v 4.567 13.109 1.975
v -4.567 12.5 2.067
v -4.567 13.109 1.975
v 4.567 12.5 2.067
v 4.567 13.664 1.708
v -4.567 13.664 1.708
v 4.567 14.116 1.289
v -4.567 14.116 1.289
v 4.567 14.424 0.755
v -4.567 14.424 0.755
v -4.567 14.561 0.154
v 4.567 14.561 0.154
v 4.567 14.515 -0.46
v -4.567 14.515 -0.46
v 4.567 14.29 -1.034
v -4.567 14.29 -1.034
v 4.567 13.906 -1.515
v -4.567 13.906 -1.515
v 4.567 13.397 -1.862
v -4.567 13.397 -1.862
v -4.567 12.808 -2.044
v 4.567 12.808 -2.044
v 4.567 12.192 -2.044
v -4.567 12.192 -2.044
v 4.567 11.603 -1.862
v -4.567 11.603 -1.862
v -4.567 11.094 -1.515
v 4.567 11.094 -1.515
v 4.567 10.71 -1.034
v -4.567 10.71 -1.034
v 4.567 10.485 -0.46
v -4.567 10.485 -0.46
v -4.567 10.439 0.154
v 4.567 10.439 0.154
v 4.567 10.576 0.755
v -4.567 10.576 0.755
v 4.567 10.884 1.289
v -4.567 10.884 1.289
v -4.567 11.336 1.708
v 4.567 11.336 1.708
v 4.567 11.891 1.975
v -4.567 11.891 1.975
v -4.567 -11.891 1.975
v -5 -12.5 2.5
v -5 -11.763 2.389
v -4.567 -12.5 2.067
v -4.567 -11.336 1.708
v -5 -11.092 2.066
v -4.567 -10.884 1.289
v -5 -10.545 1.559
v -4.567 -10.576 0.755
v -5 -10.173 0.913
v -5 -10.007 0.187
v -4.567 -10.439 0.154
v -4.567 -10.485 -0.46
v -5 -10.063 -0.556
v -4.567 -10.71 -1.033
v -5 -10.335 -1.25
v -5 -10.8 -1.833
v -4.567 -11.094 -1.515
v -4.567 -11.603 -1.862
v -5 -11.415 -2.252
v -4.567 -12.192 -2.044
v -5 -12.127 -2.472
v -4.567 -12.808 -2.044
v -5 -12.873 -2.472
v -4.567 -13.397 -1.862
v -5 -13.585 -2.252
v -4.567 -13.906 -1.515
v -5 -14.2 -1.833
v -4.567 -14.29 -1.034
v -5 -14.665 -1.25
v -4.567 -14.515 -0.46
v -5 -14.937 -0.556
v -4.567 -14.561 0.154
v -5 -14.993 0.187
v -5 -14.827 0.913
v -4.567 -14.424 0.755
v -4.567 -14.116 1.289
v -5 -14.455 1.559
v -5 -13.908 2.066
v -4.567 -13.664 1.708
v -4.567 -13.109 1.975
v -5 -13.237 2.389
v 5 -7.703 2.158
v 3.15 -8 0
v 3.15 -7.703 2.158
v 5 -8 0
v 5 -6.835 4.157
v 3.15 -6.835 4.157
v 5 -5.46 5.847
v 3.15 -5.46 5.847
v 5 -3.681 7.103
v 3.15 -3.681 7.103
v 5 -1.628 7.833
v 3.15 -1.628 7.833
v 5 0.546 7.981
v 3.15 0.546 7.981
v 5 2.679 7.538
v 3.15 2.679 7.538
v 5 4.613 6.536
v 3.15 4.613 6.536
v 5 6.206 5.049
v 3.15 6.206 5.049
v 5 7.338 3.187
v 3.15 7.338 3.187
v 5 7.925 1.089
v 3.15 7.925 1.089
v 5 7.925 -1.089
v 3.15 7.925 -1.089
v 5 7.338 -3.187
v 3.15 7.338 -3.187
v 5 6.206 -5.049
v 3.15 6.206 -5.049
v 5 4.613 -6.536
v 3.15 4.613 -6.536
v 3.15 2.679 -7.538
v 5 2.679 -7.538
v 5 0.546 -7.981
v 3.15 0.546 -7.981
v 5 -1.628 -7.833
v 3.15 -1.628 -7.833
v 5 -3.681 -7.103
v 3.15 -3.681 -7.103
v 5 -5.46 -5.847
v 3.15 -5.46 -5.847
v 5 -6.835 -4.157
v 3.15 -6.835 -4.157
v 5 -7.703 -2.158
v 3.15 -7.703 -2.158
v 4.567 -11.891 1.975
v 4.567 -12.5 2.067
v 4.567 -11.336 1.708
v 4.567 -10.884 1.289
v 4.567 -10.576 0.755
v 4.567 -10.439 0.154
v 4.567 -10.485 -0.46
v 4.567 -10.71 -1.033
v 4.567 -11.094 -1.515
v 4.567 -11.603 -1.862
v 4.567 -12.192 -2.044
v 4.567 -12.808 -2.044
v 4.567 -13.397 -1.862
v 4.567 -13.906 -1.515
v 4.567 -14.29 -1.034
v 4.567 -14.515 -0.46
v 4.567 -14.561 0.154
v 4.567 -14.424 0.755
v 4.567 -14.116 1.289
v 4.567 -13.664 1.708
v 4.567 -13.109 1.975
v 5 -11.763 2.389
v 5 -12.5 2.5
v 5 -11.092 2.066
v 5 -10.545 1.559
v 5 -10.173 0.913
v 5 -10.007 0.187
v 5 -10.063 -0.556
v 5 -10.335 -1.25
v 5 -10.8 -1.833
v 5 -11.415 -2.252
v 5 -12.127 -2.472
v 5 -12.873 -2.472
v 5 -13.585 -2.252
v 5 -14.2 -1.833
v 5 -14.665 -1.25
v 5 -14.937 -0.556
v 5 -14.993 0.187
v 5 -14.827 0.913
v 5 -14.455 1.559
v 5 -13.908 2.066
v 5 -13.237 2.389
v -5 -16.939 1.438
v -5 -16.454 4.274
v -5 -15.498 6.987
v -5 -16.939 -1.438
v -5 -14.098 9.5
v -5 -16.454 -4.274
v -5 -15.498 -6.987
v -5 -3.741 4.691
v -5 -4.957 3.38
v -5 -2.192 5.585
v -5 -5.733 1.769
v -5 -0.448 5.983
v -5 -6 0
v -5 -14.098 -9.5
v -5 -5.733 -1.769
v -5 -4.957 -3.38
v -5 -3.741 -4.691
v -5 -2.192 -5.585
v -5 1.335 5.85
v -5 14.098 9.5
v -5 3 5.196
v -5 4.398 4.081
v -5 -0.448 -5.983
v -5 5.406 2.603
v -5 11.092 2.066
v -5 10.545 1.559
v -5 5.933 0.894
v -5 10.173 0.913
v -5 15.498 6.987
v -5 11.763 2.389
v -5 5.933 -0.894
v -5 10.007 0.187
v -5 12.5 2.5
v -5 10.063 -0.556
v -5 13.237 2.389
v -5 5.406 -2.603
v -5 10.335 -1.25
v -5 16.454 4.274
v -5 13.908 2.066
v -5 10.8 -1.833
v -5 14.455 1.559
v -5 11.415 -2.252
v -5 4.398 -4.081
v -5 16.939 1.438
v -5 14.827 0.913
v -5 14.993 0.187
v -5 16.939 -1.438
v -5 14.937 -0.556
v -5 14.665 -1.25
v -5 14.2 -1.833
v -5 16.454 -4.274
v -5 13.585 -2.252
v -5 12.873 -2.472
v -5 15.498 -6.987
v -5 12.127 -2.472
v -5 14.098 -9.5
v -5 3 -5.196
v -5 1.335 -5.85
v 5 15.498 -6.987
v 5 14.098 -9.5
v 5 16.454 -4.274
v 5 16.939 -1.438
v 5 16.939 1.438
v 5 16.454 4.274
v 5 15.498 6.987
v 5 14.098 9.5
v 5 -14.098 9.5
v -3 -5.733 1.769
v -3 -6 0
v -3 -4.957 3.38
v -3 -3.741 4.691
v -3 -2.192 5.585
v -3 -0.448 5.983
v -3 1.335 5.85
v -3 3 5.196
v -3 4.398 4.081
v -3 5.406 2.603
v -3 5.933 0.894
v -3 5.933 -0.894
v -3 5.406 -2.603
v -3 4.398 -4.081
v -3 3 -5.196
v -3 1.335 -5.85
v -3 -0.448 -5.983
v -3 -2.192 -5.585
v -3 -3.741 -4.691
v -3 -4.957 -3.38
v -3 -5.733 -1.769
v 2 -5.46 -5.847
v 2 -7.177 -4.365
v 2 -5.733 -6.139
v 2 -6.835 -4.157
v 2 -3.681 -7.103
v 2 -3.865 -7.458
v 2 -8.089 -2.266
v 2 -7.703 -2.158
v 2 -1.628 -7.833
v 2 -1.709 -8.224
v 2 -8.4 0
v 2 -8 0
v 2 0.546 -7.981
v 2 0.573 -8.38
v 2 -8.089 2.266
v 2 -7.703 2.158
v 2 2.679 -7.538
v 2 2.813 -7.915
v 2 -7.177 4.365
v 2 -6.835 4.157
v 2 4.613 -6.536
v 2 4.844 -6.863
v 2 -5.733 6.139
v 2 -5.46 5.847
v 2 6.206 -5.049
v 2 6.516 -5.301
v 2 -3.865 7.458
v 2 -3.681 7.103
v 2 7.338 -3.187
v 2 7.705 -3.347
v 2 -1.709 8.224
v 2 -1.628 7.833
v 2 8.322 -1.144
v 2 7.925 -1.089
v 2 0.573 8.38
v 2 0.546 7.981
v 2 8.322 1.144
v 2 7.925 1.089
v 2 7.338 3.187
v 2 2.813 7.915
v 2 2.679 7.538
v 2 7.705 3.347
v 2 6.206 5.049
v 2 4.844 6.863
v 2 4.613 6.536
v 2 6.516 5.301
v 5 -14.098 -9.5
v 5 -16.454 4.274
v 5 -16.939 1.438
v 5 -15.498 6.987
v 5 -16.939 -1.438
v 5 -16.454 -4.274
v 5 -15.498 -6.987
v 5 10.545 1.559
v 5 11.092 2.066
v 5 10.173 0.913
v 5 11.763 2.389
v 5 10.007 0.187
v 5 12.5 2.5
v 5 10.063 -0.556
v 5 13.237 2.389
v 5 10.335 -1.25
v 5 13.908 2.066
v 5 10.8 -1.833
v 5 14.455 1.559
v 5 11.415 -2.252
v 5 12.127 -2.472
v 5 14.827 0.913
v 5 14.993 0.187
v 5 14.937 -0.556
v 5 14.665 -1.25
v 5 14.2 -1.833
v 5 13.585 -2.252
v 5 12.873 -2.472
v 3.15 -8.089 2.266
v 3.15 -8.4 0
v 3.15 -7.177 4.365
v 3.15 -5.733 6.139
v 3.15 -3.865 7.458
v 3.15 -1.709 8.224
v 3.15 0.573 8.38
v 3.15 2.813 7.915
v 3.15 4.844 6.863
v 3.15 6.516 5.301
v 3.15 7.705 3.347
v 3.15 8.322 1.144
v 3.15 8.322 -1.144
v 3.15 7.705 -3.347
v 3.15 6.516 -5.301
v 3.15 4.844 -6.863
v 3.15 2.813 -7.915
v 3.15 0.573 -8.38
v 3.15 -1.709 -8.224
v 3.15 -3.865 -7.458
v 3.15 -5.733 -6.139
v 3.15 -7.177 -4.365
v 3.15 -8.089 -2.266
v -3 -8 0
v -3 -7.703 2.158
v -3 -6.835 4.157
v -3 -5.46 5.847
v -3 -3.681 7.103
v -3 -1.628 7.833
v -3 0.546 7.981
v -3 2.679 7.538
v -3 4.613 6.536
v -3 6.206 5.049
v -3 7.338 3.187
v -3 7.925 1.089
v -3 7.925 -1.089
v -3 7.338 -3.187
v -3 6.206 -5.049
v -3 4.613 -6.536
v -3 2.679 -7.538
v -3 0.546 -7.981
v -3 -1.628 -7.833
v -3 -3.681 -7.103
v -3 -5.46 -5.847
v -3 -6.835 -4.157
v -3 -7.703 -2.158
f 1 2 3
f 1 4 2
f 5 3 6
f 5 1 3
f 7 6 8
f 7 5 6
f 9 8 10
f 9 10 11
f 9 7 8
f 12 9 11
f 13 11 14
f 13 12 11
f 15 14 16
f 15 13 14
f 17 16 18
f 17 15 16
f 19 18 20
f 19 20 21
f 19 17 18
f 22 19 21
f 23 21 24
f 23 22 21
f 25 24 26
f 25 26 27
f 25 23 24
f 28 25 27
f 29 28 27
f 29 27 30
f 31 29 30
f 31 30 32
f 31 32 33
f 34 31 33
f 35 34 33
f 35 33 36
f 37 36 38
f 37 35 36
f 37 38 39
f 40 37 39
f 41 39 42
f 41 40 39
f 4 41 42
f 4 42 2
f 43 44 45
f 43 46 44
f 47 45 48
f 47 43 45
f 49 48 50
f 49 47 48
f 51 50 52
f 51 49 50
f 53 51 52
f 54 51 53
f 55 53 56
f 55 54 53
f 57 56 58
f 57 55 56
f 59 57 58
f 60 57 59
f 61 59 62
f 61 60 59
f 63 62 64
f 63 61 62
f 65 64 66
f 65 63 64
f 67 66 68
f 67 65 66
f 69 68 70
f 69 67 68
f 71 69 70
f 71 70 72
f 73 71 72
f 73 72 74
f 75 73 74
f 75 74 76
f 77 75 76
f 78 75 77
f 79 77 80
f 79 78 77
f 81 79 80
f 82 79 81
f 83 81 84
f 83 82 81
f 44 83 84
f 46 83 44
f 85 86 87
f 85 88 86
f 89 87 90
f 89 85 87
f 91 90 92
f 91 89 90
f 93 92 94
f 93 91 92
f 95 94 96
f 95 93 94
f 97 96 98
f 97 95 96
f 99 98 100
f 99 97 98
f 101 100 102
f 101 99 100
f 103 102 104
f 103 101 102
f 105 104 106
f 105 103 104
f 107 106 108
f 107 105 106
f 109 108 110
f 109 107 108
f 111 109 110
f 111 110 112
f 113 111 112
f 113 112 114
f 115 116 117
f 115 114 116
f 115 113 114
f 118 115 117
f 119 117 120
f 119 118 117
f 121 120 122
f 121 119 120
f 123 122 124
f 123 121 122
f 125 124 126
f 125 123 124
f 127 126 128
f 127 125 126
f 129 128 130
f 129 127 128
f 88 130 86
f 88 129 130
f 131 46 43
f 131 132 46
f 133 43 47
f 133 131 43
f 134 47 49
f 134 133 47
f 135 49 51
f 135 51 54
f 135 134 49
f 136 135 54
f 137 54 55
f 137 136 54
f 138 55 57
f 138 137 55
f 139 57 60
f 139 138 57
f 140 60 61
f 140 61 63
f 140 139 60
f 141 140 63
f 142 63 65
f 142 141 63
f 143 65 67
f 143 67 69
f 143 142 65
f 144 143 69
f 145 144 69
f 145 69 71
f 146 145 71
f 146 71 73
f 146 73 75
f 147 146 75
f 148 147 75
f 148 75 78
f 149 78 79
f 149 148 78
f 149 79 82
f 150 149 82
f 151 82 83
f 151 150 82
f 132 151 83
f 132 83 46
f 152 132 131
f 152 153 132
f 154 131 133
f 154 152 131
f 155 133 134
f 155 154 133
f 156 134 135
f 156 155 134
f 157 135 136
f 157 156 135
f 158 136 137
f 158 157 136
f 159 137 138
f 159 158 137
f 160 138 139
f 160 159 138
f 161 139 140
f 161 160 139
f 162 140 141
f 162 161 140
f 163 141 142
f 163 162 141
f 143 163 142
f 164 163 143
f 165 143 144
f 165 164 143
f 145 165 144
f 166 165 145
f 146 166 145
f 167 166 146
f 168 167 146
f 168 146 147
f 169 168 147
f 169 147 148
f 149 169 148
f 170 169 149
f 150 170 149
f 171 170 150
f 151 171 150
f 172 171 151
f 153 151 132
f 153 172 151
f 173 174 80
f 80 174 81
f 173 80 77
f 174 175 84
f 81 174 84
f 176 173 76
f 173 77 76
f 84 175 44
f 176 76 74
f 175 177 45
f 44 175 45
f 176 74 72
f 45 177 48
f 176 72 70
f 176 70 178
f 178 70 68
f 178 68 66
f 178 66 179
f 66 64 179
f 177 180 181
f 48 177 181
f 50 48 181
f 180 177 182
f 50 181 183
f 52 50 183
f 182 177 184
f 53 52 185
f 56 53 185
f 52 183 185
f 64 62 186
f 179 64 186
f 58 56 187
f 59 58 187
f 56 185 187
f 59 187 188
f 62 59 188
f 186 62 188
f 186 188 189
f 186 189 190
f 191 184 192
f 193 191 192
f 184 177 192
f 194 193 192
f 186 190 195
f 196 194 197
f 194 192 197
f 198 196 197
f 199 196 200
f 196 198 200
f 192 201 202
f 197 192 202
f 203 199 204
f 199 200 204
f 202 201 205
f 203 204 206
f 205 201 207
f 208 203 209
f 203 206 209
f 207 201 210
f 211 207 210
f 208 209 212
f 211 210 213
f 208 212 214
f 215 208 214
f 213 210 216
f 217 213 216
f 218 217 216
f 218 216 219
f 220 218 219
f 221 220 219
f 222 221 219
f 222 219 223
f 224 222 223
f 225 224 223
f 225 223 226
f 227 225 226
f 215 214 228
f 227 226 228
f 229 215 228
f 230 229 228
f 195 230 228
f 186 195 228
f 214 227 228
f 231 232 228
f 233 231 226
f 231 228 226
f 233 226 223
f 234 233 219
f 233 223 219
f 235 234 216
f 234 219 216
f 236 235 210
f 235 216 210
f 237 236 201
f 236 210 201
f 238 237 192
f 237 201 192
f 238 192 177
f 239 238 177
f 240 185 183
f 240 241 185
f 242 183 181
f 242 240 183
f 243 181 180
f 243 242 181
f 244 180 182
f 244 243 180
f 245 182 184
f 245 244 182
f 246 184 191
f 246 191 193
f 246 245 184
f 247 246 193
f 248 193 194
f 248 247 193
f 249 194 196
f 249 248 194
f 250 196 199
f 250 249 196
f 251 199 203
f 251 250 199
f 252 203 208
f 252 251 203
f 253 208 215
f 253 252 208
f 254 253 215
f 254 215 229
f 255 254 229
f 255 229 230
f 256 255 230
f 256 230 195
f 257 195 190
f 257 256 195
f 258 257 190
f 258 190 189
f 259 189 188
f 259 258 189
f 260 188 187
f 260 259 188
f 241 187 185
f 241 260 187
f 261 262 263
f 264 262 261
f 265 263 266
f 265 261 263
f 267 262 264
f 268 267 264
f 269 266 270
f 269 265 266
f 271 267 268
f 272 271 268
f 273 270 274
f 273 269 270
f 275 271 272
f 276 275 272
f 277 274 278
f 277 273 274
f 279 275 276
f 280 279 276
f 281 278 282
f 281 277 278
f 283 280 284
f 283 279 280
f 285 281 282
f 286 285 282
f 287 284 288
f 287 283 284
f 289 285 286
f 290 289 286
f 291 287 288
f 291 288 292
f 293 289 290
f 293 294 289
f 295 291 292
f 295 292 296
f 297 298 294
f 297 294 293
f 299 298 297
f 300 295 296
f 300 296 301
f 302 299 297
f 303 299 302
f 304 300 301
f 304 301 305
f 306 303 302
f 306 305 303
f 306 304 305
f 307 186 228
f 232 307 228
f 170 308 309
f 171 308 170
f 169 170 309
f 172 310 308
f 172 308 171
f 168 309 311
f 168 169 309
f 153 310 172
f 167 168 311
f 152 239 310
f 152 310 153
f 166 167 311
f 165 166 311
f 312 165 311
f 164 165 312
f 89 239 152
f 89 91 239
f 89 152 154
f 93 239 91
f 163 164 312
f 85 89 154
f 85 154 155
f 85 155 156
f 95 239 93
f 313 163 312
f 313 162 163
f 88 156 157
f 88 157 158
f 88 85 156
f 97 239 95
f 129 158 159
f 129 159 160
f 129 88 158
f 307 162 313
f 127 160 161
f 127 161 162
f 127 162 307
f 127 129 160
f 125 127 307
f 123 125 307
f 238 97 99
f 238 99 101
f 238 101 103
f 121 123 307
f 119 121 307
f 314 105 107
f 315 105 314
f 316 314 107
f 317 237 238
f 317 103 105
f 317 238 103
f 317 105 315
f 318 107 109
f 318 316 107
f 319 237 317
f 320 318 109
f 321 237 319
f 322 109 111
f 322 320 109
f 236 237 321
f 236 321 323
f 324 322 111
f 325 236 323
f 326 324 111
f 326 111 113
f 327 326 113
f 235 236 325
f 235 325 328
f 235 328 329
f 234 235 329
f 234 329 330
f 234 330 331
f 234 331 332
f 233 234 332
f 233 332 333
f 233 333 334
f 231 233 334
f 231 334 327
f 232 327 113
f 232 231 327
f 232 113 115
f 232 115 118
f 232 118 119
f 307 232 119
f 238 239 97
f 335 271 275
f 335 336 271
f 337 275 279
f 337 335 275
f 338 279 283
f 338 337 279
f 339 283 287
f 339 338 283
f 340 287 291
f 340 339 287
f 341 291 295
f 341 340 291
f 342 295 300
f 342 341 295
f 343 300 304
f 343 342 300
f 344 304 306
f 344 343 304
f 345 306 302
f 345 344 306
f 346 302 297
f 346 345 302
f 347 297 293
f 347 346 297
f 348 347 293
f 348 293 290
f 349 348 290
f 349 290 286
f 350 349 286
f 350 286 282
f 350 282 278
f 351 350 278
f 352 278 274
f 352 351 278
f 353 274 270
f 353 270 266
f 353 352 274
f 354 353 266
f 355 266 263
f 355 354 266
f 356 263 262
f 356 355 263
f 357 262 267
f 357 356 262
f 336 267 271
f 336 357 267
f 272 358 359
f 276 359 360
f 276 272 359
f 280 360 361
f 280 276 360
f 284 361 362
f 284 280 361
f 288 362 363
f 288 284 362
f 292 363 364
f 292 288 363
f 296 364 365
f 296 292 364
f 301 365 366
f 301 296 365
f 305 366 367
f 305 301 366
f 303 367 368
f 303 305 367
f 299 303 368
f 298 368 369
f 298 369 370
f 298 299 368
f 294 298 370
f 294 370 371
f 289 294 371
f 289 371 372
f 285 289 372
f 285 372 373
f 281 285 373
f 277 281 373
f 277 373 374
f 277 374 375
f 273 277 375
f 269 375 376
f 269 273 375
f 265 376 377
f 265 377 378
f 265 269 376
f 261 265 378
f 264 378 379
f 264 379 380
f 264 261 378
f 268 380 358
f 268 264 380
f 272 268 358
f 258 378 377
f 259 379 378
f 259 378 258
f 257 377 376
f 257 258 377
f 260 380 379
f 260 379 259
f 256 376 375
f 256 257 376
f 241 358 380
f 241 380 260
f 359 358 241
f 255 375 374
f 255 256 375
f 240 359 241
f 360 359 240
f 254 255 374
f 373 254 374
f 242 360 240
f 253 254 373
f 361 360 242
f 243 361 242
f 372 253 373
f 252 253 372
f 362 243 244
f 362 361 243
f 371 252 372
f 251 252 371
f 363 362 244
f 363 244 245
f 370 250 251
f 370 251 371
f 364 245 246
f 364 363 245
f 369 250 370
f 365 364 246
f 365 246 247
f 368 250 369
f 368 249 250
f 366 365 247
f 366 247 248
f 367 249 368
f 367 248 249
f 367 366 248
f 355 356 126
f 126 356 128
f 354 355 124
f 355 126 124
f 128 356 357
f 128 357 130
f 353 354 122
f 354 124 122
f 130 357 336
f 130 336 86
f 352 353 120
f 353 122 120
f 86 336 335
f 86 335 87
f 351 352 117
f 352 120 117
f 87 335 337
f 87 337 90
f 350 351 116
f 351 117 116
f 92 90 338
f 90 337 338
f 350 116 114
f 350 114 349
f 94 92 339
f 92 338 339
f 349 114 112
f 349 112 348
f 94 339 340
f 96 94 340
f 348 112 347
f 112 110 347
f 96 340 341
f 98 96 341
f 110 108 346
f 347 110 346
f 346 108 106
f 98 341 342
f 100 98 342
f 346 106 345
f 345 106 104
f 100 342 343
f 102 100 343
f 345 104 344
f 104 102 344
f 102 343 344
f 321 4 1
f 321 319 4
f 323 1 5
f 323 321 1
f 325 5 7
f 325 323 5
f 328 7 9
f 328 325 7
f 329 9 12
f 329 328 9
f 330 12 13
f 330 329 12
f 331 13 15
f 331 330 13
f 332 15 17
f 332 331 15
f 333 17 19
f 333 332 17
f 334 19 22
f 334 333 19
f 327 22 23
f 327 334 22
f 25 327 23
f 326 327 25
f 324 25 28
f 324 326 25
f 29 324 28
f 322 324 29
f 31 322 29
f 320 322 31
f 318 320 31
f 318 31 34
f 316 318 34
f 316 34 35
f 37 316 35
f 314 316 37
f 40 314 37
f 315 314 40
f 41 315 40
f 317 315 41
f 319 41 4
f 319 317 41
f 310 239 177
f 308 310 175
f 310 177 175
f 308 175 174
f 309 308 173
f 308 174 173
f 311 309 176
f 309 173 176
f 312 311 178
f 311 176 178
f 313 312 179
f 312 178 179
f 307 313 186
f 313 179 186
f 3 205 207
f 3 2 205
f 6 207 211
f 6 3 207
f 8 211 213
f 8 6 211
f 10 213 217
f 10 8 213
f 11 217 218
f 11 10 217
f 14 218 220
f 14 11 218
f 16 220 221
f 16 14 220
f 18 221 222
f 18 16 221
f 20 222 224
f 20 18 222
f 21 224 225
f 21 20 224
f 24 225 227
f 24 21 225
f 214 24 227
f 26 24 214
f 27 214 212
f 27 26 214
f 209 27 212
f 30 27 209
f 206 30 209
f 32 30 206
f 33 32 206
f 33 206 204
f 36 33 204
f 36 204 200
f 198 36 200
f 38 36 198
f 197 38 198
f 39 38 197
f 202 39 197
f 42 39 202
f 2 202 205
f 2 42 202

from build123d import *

# Parameters (mm, degrees)
BOSS_EXTRUDE1_DEPTH      = 5
BOSS_EXTRUDE1_DEPTH_BACK = 5
SKETCH3_W                = 1.15
SKETCH3_H                = 8.4


with BuildPart() as part:
    # Sketch1 → Boss-Extrude1 (new, two sides: drawn at the far end of the back side and taken through both)
    with BuildSketch(Plane(origin=(0, 0, 0), x_dir=(0, 0, -1), z_dir=(1, 0, 0)).offset(-BOSS_EXTRUDE1_DEPTH_BACK)):
        with BuildLine():
            Line((9.5, -14.09787218), (9.5, 14.09787218))
            ThreePointArc((9.5, 14.09787218), (0, 17), (-9.5, 14.09787218))
            Line((-9.5, 14.09787218), (-9.5, -14.09787218))
            ThreePointArc((-9.5, -14.09787218), (0, -17), (9.5, -14.09787218))
        make_face()
    extrude(amount=BOSS_EXTRUDE1_DEPTH + BOSS_EXTRUDE1_DEPTH_BACK)

    # Sketch2 → Cut-Revolve1 (revolve, cut)
    with BuildSketch(Plane.XY):
        Polygon((-5, 0), (-5, 6), (-3, 6), (-3, 8), (5, 8), (5, 0), align=None)
    revolve(axis=Axis((5, 0, 0), (-1, 0, 0)), mode=Mode.SUBTRACT)

    # Sketch3 → Cut-Revolve2 (revolve, cut)
    with BuildSketch(Plane.XY):
        with Locations((2.575, 4.2)):
            Rectangle(SKETCH3_W, SKETCH3_H)
    revolve(axis=Axis((3.15, 0, 0), (-1, 0, 0)), mode=Mode.SUBTRACT)

    # Sketch4 → Cut-Revolve3 (revolve, cut)
    with BuildSketch(Plane.XY):
        Polygon((-5, -12.5), (-5, -10), (-4.567, -10.433), (4.567, -10.433), (5, -10), (5, -12.5), align=None)
    revolve(axis=Axis((5, -12.5, 0), (-1, 0, 0)), mode=Mode.SUBTRACT)

    # Sketch5 → Cut-Revolve4 (revolve, cut)
    with BuildSketch(Plane.XY):
        Polygon((-5, 12.5), (-5, 15), (-4.567, 14.567), (4.567, 14.567), (5, 15), (5, 12.5), align=None)
    revolve(axis=Axis((5, 12.5, 0), (-1, 0, 0)), mode=Mode.SUBTRACT)


solid = part.part
